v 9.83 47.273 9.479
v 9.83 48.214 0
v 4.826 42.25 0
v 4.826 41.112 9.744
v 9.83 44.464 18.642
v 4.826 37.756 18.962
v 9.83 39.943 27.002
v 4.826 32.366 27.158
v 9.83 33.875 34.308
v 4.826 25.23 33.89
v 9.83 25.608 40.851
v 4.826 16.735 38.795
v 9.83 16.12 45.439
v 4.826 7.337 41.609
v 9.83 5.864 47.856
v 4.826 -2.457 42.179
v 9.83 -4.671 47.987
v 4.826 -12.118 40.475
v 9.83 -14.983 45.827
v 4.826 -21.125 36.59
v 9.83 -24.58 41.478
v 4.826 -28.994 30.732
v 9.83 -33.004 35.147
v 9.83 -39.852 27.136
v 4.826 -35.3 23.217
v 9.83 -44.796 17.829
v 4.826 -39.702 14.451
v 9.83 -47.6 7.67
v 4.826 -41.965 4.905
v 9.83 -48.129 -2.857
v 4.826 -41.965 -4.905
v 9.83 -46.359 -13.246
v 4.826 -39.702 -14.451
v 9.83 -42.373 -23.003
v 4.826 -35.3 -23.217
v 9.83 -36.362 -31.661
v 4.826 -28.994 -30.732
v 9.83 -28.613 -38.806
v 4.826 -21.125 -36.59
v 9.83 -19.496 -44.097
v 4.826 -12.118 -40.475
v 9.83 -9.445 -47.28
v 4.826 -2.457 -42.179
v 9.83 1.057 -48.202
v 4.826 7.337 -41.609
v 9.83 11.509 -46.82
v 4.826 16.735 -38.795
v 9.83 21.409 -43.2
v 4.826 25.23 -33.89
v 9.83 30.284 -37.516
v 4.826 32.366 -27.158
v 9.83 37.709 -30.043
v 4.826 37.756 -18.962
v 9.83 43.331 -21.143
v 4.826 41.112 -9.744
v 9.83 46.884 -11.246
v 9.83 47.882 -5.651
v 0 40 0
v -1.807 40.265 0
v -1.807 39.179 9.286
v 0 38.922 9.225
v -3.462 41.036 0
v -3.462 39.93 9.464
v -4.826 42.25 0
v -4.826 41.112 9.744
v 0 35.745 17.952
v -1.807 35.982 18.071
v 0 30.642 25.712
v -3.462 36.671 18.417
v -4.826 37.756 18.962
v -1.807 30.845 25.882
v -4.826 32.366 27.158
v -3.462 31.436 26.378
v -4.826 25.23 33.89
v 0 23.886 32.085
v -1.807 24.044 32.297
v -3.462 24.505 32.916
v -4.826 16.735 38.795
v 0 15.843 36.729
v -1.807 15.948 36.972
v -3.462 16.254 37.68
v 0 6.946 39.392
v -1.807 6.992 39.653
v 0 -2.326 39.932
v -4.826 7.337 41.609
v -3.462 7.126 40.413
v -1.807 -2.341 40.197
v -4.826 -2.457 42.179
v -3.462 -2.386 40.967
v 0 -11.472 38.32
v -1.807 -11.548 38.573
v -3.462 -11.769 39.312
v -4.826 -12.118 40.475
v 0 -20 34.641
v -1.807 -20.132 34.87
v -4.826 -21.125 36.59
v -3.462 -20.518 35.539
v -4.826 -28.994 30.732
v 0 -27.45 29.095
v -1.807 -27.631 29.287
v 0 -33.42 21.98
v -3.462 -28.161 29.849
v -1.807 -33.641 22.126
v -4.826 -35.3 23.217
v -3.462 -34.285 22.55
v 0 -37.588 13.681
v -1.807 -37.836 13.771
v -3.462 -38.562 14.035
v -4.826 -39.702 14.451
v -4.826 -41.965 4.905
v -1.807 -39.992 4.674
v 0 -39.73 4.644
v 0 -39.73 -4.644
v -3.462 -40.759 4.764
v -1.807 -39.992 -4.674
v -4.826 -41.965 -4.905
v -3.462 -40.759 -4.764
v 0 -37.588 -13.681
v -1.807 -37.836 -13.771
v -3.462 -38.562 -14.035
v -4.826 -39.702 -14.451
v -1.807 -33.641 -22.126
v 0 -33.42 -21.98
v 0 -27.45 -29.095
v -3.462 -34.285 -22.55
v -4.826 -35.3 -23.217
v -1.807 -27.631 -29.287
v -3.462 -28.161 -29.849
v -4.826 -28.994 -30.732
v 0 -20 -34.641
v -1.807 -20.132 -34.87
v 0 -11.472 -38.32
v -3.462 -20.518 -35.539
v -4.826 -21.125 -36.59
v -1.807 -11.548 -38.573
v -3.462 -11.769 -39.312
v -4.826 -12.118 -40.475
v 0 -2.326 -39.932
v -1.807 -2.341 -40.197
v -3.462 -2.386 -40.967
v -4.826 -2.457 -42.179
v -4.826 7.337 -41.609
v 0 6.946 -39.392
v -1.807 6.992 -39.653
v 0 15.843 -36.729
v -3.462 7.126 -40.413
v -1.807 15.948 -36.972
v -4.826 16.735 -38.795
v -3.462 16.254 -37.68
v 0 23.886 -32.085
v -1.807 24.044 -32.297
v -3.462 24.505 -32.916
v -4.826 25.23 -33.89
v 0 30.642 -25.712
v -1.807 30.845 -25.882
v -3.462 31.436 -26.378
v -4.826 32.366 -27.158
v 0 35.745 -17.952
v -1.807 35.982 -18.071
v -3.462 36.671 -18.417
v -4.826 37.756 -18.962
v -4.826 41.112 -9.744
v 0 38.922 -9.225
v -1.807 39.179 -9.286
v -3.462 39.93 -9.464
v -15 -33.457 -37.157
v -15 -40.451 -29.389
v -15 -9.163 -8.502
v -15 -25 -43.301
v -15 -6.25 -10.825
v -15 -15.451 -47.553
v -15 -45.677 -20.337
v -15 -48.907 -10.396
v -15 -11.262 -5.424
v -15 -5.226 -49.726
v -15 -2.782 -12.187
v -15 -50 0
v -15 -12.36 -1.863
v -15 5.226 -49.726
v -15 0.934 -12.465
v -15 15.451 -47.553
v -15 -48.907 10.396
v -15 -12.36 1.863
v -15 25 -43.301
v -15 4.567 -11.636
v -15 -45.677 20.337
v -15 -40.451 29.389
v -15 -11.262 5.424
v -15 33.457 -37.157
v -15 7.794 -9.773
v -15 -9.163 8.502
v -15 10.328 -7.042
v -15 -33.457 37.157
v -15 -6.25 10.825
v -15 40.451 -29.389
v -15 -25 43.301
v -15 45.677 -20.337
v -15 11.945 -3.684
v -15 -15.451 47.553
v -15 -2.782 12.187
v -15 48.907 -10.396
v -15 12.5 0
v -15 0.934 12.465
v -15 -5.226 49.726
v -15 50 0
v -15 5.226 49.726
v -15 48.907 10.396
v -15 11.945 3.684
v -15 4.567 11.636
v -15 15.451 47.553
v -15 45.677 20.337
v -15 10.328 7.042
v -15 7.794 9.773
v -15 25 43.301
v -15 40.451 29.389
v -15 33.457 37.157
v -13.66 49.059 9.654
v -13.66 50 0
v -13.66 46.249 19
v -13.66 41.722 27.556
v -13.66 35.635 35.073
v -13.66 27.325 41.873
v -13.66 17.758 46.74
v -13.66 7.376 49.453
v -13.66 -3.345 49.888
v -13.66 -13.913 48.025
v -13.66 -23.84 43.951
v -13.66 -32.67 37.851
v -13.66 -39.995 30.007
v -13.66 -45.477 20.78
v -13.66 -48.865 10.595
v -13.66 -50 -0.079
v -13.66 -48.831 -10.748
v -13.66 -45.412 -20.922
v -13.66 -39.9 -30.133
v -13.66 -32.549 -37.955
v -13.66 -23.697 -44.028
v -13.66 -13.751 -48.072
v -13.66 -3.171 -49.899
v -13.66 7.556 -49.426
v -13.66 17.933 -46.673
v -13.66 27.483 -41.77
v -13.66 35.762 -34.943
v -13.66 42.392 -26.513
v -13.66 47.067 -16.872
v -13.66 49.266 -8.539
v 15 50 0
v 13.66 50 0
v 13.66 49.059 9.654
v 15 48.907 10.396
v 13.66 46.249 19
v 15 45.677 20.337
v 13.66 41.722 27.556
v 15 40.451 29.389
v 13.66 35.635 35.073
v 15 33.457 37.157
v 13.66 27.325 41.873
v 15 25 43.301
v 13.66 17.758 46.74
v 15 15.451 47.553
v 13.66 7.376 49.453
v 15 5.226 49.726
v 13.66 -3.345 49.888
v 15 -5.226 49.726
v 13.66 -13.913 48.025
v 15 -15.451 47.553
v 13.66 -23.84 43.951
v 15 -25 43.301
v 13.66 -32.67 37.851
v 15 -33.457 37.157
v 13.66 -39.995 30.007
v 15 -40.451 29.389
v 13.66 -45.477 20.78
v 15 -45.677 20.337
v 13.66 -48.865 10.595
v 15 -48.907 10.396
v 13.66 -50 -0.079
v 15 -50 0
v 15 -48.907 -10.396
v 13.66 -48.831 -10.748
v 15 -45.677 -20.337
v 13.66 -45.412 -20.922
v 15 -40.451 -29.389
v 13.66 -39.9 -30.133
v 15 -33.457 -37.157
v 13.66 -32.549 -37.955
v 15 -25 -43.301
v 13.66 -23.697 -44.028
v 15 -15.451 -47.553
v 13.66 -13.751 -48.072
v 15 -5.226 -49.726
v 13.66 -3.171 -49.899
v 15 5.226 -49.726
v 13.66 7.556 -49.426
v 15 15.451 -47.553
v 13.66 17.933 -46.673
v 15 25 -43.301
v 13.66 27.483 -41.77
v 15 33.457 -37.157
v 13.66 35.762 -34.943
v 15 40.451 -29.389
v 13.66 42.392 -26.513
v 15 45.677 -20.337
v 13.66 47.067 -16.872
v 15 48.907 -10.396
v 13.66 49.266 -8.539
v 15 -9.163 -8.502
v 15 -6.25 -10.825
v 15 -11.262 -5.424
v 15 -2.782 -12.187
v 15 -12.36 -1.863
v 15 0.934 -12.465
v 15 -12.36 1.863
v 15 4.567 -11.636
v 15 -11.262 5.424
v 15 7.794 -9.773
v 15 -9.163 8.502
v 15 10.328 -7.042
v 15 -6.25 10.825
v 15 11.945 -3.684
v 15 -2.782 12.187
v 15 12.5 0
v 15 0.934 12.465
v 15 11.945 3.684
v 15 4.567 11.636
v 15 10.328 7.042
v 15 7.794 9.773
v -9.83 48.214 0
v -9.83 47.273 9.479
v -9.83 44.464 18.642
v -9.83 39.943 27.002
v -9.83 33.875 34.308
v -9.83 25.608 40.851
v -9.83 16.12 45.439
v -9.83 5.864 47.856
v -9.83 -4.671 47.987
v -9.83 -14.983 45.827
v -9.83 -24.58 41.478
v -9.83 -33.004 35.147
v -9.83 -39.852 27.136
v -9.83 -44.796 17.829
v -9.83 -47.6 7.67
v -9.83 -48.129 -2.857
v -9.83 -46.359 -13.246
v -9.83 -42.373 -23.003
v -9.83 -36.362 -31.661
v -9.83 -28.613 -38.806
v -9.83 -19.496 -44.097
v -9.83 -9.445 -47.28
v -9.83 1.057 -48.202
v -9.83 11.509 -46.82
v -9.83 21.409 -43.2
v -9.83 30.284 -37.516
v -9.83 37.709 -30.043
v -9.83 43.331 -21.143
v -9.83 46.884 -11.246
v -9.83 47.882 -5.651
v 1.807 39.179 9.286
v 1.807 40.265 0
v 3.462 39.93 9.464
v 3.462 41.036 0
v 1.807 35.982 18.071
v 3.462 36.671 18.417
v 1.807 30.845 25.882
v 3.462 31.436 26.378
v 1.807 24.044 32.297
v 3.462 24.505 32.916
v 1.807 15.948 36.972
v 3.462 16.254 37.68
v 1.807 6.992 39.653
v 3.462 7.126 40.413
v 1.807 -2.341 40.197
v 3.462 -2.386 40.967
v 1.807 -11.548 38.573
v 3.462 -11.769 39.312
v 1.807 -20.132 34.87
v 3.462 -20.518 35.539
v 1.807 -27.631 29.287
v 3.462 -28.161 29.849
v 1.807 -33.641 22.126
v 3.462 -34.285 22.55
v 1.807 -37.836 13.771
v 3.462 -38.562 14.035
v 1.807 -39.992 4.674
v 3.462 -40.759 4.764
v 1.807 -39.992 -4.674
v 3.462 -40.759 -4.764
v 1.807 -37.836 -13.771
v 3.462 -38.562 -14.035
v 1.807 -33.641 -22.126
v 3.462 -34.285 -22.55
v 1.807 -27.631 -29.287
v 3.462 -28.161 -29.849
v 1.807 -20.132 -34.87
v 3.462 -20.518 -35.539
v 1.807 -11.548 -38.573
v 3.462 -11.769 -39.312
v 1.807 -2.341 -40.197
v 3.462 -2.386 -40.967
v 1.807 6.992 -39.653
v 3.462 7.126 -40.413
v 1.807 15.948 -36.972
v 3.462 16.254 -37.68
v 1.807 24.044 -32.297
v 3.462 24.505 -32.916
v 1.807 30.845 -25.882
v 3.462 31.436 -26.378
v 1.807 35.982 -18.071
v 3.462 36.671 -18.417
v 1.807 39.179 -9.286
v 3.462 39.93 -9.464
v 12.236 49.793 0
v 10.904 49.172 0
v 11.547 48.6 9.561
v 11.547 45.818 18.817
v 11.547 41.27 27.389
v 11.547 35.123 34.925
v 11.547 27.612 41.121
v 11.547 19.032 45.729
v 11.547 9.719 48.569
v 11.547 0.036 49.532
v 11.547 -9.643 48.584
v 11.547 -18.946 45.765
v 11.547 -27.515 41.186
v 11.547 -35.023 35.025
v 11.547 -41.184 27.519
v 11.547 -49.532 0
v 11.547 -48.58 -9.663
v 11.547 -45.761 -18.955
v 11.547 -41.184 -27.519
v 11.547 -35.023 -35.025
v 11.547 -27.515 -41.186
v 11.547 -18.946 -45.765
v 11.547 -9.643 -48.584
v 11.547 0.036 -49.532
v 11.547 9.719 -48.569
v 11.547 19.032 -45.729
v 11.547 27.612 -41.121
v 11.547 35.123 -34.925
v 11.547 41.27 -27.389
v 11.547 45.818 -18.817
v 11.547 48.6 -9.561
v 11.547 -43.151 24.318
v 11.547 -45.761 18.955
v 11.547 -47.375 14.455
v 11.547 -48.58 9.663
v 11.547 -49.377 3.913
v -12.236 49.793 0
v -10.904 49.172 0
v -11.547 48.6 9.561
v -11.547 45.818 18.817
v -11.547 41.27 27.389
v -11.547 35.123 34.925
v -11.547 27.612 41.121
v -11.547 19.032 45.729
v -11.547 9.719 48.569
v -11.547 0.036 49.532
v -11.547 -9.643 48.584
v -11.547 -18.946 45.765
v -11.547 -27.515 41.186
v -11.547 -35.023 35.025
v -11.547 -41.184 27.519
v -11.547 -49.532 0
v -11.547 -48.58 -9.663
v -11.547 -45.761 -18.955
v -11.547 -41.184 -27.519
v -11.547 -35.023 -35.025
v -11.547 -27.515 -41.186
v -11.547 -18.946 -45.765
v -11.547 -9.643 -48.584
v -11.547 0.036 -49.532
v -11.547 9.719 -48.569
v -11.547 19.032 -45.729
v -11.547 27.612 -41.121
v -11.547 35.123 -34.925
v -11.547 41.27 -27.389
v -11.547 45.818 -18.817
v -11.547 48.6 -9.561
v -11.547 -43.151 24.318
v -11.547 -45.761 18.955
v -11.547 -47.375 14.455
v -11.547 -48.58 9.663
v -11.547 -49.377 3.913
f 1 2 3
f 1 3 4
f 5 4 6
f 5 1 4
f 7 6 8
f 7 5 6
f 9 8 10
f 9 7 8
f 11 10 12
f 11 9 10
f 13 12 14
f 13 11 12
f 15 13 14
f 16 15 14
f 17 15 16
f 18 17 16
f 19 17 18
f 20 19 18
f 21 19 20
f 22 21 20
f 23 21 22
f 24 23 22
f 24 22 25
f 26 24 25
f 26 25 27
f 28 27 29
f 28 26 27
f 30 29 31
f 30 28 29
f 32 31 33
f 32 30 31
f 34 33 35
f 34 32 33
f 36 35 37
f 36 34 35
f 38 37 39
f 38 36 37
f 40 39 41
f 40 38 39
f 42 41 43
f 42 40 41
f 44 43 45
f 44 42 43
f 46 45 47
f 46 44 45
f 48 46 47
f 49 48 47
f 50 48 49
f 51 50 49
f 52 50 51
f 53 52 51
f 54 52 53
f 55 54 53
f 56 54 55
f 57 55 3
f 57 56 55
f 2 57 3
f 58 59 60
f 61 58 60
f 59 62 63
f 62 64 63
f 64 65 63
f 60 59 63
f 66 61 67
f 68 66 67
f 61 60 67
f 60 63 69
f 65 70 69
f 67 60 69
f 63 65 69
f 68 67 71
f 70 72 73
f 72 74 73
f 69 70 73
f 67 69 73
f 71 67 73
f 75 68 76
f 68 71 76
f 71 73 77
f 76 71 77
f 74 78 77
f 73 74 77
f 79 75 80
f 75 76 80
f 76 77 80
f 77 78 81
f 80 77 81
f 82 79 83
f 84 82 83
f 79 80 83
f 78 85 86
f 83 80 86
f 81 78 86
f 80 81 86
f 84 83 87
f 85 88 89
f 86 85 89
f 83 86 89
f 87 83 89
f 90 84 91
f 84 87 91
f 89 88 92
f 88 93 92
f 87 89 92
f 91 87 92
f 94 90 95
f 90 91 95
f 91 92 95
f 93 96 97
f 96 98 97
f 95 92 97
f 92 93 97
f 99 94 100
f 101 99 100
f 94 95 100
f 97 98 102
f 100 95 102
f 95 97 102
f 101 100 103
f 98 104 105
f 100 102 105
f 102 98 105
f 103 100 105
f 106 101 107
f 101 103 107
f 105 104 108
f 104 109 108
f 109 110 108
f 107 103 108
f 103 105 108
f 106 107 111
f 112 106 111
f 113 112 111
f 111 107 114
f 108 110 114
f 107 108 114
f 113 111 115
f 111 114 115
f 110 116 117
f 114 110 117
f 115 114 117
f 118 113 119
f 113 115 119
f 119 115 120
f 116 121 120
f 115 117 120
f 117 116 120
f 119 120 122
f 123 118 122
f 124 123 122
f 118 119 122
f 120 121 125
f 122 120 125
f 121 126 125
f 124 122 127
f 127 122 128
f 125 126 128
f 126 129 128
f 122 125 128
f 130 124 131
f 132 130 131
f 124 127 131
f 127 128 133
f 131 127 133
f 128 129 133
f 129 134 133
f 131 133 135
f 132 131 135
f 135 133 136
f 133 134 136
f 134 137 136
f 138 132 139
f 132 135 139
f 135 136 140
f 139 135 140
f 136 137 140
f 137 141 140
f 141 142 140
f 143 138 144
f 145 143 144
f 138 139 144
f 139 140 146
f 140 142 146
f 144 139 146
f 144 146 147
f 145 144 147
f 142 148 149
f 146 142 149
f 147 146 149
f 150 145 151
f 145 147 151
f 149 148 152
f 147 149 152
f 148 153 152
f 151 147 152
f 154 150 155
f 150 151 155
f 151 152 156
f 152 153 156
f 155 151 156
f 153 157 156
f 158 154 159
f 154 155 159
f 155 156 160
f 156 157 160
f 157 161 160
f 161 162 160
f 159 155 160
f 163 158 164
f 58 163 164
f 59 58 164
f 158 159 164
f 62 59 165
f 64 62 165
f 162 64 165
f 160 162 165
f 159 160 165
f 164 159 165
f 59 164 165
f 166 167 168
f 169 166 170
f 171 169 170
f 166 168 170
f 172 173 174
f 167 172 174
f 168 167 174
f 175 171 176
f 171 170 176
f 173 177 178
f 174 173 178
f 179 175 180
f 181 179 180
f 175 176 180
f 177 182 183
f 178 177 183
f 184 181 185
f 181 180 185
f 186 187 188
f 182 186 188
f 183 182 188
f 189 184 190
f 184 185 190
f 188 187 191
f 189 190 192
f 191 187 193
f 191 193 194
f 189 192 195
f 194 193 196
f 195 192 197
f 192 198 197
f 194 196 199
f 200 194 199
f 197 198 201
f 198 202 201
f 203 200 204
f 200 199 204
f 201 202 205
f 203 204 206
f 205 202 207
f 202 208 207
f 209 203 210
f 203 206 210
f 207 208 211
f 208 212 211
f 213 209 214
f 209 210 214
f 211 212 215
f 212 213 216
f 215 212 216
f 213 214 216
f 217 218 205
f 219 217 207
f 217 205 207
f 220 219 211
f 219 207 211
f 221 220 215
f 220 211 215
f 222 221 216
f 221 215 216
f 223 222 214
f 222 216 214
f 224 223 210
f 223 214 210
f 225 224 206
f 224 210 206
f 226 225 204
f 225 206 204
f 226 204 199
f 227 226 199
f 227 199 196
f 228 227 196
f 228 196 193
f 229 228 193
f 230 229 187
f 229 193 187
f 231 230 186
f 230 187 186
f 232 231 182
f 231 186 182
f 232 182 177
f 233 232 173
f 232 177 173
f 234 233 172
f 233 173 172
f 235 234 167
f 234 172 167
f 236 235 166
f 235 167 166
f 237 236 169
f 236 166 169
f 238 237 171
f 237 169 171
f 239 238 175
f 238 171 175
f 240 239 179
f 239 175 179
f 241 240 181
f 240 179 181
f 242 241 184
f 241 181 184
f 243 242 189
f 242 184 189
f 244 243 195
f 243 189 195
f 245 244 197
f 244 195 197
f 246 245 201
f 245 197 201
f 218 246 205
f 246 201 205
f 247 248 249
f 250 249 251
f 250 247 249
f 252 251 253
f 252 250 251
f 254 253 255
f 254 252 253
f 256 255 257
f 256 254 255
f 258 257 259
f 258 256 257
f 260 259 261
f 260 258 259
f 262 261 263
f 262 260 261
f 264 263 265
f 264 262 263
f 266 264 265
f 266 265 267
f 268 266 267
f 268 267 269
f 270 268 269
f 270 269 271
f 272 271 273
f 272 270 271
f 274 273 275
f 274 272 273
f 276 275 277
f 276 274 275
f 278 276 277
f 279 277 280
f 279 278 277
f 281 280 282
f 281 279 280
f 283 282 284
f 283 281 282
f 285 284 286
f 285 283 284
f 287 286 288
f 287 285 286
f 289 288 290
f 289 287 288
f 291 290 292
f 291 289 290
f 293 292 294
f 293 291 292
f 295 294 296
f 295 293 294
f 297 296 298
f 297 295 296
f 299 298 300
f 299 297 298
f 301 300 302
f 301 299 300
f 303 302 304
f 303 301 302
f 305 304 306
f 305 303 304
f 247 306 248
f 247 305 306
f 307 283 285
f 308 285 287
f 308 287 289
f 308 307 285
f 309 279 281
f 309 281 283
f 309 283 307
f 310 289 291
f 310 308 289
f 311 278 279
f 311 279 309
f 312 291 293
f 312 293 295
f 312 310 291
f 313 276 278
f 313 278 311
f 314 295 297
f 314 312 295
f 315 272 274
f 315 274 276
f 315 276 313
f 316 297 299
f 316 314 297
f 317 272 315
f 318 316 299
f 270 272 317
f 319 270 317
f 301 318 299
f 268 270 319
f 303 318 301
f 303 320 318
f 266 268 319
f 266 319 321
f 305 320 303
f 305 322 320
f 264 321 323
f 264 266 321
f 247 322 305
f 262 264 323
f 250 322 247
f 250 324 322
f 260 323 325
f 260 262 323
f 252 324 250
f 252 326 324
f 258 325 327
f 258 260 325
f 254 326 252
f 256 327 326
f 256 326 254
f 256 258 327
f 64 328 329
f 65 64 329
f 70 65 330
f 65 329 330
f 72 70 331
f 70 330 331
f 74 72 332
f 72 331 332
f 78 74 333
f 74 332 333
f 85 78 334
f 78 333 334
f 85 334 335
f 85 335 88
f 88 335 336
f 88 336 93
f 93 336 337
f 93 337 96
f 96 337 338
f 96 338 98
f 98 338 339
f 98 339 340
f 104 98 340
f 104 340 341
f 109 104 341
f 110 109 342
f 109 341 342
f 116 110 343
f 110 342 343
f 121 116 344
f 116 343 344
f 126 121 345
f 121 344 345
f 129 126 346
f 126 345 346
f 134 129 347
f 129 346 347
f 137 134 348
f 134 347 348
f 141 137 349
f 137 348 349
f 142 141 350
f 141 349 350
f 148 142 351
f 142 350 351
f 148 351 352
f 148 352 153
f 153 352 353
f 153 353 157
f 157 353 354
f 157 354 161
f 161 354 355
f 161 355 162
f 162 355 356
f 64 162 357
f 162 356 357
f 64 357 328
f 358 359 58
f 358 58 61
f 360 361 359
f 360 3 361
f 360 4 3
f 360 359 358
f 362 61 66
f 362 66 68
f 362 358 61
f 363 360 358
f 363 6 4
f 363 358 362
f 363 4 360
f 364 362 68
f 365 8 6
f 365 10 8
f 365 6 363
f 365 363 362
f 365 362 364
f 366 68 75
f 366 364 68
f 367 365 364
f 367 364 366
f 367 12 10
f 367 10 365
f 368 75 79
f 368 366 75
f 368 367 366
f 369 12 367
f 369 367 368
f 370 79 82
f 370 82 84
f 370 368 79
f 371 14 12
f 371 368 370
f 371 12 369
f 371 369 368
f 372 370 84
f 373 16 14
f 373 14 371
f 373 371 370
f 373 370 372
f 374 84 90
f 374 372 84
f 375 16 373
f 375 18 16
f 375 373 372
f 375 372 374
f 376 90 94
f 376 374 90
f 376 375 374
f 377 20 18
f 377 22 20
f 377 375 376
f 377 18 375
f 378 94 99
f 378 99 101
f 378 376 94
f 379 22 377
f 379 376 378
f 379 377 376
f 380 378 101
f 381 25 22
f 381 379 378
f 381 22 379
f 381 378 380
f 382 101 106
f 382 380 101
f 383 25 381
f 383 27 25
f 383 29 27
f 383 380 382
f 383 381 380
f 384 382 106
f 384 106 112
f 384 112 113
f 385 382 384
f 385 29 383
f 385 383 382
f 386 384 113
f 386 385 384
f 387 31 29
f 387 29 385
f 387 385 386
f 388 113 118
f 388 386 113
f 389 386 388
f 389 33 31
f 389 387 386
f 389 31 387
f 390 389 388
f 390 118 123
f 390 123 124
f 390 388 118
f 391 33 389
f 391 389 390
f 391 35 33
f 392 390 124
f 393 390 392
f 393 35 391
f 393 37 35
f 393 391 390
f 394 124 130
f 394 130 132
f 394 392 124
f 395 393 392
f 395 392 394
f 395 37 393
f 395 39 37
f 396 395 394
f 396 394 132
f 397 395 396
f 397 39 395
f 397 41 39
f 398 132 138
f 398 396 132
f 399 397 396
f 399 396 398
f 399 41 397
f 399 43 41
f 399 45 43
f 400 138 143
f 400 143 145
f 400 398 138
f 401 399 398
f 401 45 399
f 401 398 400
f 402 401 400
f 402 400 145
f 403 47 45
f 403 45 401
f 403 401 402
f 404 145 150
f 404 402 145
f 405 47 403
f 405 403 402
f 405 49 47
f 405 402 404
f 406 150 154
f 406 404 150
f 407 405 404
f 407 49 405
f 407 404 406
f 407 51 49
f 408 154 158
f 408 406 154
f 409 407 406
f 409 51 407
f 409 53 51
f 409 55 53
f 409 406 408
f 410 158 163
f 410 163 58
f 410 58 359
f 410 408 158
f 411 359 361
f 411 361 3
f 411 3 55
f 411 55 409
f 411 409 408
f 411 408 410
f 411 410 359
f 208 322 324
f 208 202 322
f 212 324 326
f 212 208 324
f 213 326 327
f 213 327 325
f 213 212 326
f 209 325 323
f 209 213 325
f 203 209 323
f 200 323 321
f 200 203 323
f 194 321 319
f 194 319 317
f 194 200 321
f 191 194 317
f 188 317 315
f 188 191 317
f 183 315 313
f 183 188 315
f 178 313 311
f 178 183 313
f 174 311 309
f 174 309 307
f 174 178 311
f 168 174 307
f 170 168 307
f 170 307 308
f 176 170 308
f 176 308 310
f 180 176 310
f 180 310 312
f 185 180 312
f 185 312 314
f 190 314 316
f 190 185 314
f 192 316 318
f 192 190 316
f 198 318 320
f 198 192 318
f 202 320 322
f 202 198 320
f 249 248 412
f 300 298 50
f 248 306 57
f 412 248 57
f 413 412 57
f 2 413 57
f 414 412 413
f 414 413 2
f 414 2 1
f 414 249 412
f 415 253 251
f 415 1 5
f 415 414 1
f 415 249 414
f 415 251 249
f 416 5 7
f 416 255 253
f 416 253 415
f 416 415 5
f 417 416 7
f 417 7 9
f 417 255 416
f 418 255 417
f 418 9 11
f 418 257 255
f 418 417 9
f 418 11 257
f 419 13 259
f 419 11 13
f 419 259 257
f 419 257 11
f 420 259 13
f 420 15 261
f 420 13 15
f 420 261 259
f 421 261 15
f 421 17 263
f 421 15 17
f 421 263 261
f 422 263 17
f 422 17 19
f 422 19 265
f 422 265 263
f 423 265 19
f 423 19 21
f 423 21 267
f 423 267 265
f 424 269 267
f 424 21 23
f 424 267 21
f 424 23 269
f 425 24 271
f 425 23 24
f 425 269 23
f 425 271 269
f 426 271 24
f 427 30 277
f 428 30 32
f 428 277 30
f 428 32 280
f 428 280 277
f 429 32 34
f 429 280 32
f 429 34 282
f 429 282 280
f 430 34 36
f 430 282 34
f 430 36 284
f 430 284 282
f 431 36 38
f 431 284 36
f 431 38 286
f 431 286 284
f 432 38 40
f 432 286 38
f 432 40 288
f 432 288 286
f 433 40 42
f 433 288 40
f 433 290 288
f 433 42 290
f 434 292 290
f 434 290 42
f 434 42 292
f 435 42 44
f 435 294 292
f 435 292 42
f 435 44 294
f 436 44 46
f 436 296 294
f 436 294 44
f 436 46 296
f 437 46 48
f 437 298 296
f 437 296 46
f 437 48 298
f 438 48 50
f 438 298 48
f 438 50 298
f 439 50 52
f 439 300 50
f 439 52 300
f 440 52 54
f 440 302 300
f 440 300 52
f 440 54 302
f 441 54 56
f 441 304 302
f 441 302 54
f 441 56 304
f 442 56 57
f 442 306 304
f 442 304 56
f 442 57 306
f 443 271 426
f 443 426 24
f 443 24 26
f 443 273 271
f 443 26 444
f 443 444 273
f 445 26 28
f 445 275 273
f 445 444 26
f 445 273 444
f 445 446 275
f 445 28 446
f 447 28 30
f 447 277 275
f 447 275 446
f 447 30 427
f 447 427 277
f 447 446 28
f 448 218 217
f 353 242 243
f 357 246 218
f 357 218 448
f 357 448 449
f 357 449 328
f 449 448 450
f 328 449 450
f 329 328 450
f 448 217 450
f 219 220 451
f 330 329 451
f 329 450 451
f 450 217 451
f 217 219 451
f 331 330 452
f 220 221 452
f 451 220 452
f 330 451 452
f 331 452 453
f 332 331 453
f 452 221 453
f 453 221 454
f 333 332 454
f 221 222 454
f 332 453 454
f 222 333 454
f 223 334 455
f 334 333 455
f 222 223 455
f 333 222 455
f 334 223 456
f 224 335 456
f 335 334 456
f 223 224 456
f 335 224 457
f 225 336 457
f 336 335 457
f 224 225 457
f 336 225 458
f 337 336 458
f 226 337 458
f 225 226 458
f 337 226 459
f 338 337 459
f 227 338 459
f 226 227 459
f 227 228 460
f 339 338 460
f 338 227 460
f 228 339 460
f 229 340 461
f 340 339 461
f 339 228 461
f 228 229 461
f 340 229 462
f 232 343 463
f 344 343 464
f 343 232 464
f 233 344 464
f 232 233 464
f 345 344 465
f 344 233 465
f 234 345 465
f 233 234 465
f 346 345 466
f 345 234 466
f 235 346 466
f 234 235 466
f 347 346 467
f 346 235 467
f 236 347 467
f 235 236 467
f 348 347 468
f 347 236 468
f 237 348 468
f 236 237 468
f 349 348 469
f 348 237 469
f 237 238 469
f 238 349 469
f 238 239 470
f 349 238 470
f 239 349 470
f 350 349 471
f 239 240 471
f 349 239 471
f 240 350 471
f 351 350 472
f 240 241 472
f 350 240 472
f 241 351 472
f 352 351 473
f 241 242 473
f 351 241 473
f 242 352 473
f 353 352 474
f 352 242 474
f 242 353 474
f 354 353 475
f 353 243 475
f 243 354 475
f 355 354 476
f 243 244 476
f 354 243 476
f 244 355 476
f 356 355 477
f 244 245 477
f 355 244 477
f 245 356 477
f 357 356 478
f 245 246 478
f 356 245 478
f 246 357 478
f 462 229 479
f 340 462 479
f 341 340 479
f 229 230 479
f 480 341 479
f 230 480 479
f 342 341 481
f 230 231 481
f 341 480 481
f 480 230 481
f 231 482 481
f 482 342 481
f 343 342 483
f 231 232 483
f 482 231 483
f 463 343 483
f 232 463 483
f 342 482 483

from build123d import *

# Parameters (mm, degrees)
FILLET1_R = 5


with BuildPart() as part:
    # Sketch1 → Revolve1 (revolve)
    with BuildSketch(Plane.XY):
        with BuildLine():
            Line((-11.328734558, 50), (-15, 50))
            Line((-15, 50), (-15, 12.5))
            Line((-15, 12.5), (0, 12.5))
            Line((0, 12.5), (0, 40))
            ThreePointArc((0, 40), (-2.662495049, 40.590260942), (-4.826079992, 42.250438059))
            Line((-4.826079992, 42.250438059), (-11.328734558, 50))
        make_face()
    revolve1 = revolve(axis=Axis((-75.888260409, 0, 0), (1, 0, 0)))

    # Mirror1: Revolve1 across plane
    add(revolve1.mirror(Plane(origin=(0, 12.5, 0), x_dir=(0, 0, 1), z_dir=(-1, 0, 0))))

    # Fillet1
    fillet1_edges = [part.edges().sort_by_distance(p)[0] for p in [
        (11.328734558, -50, 0),
        (-11.328734558, -50, 0),
    ]]
    fillet(fillet1_edges, radius=FILLET1_R)


solid = part.part
